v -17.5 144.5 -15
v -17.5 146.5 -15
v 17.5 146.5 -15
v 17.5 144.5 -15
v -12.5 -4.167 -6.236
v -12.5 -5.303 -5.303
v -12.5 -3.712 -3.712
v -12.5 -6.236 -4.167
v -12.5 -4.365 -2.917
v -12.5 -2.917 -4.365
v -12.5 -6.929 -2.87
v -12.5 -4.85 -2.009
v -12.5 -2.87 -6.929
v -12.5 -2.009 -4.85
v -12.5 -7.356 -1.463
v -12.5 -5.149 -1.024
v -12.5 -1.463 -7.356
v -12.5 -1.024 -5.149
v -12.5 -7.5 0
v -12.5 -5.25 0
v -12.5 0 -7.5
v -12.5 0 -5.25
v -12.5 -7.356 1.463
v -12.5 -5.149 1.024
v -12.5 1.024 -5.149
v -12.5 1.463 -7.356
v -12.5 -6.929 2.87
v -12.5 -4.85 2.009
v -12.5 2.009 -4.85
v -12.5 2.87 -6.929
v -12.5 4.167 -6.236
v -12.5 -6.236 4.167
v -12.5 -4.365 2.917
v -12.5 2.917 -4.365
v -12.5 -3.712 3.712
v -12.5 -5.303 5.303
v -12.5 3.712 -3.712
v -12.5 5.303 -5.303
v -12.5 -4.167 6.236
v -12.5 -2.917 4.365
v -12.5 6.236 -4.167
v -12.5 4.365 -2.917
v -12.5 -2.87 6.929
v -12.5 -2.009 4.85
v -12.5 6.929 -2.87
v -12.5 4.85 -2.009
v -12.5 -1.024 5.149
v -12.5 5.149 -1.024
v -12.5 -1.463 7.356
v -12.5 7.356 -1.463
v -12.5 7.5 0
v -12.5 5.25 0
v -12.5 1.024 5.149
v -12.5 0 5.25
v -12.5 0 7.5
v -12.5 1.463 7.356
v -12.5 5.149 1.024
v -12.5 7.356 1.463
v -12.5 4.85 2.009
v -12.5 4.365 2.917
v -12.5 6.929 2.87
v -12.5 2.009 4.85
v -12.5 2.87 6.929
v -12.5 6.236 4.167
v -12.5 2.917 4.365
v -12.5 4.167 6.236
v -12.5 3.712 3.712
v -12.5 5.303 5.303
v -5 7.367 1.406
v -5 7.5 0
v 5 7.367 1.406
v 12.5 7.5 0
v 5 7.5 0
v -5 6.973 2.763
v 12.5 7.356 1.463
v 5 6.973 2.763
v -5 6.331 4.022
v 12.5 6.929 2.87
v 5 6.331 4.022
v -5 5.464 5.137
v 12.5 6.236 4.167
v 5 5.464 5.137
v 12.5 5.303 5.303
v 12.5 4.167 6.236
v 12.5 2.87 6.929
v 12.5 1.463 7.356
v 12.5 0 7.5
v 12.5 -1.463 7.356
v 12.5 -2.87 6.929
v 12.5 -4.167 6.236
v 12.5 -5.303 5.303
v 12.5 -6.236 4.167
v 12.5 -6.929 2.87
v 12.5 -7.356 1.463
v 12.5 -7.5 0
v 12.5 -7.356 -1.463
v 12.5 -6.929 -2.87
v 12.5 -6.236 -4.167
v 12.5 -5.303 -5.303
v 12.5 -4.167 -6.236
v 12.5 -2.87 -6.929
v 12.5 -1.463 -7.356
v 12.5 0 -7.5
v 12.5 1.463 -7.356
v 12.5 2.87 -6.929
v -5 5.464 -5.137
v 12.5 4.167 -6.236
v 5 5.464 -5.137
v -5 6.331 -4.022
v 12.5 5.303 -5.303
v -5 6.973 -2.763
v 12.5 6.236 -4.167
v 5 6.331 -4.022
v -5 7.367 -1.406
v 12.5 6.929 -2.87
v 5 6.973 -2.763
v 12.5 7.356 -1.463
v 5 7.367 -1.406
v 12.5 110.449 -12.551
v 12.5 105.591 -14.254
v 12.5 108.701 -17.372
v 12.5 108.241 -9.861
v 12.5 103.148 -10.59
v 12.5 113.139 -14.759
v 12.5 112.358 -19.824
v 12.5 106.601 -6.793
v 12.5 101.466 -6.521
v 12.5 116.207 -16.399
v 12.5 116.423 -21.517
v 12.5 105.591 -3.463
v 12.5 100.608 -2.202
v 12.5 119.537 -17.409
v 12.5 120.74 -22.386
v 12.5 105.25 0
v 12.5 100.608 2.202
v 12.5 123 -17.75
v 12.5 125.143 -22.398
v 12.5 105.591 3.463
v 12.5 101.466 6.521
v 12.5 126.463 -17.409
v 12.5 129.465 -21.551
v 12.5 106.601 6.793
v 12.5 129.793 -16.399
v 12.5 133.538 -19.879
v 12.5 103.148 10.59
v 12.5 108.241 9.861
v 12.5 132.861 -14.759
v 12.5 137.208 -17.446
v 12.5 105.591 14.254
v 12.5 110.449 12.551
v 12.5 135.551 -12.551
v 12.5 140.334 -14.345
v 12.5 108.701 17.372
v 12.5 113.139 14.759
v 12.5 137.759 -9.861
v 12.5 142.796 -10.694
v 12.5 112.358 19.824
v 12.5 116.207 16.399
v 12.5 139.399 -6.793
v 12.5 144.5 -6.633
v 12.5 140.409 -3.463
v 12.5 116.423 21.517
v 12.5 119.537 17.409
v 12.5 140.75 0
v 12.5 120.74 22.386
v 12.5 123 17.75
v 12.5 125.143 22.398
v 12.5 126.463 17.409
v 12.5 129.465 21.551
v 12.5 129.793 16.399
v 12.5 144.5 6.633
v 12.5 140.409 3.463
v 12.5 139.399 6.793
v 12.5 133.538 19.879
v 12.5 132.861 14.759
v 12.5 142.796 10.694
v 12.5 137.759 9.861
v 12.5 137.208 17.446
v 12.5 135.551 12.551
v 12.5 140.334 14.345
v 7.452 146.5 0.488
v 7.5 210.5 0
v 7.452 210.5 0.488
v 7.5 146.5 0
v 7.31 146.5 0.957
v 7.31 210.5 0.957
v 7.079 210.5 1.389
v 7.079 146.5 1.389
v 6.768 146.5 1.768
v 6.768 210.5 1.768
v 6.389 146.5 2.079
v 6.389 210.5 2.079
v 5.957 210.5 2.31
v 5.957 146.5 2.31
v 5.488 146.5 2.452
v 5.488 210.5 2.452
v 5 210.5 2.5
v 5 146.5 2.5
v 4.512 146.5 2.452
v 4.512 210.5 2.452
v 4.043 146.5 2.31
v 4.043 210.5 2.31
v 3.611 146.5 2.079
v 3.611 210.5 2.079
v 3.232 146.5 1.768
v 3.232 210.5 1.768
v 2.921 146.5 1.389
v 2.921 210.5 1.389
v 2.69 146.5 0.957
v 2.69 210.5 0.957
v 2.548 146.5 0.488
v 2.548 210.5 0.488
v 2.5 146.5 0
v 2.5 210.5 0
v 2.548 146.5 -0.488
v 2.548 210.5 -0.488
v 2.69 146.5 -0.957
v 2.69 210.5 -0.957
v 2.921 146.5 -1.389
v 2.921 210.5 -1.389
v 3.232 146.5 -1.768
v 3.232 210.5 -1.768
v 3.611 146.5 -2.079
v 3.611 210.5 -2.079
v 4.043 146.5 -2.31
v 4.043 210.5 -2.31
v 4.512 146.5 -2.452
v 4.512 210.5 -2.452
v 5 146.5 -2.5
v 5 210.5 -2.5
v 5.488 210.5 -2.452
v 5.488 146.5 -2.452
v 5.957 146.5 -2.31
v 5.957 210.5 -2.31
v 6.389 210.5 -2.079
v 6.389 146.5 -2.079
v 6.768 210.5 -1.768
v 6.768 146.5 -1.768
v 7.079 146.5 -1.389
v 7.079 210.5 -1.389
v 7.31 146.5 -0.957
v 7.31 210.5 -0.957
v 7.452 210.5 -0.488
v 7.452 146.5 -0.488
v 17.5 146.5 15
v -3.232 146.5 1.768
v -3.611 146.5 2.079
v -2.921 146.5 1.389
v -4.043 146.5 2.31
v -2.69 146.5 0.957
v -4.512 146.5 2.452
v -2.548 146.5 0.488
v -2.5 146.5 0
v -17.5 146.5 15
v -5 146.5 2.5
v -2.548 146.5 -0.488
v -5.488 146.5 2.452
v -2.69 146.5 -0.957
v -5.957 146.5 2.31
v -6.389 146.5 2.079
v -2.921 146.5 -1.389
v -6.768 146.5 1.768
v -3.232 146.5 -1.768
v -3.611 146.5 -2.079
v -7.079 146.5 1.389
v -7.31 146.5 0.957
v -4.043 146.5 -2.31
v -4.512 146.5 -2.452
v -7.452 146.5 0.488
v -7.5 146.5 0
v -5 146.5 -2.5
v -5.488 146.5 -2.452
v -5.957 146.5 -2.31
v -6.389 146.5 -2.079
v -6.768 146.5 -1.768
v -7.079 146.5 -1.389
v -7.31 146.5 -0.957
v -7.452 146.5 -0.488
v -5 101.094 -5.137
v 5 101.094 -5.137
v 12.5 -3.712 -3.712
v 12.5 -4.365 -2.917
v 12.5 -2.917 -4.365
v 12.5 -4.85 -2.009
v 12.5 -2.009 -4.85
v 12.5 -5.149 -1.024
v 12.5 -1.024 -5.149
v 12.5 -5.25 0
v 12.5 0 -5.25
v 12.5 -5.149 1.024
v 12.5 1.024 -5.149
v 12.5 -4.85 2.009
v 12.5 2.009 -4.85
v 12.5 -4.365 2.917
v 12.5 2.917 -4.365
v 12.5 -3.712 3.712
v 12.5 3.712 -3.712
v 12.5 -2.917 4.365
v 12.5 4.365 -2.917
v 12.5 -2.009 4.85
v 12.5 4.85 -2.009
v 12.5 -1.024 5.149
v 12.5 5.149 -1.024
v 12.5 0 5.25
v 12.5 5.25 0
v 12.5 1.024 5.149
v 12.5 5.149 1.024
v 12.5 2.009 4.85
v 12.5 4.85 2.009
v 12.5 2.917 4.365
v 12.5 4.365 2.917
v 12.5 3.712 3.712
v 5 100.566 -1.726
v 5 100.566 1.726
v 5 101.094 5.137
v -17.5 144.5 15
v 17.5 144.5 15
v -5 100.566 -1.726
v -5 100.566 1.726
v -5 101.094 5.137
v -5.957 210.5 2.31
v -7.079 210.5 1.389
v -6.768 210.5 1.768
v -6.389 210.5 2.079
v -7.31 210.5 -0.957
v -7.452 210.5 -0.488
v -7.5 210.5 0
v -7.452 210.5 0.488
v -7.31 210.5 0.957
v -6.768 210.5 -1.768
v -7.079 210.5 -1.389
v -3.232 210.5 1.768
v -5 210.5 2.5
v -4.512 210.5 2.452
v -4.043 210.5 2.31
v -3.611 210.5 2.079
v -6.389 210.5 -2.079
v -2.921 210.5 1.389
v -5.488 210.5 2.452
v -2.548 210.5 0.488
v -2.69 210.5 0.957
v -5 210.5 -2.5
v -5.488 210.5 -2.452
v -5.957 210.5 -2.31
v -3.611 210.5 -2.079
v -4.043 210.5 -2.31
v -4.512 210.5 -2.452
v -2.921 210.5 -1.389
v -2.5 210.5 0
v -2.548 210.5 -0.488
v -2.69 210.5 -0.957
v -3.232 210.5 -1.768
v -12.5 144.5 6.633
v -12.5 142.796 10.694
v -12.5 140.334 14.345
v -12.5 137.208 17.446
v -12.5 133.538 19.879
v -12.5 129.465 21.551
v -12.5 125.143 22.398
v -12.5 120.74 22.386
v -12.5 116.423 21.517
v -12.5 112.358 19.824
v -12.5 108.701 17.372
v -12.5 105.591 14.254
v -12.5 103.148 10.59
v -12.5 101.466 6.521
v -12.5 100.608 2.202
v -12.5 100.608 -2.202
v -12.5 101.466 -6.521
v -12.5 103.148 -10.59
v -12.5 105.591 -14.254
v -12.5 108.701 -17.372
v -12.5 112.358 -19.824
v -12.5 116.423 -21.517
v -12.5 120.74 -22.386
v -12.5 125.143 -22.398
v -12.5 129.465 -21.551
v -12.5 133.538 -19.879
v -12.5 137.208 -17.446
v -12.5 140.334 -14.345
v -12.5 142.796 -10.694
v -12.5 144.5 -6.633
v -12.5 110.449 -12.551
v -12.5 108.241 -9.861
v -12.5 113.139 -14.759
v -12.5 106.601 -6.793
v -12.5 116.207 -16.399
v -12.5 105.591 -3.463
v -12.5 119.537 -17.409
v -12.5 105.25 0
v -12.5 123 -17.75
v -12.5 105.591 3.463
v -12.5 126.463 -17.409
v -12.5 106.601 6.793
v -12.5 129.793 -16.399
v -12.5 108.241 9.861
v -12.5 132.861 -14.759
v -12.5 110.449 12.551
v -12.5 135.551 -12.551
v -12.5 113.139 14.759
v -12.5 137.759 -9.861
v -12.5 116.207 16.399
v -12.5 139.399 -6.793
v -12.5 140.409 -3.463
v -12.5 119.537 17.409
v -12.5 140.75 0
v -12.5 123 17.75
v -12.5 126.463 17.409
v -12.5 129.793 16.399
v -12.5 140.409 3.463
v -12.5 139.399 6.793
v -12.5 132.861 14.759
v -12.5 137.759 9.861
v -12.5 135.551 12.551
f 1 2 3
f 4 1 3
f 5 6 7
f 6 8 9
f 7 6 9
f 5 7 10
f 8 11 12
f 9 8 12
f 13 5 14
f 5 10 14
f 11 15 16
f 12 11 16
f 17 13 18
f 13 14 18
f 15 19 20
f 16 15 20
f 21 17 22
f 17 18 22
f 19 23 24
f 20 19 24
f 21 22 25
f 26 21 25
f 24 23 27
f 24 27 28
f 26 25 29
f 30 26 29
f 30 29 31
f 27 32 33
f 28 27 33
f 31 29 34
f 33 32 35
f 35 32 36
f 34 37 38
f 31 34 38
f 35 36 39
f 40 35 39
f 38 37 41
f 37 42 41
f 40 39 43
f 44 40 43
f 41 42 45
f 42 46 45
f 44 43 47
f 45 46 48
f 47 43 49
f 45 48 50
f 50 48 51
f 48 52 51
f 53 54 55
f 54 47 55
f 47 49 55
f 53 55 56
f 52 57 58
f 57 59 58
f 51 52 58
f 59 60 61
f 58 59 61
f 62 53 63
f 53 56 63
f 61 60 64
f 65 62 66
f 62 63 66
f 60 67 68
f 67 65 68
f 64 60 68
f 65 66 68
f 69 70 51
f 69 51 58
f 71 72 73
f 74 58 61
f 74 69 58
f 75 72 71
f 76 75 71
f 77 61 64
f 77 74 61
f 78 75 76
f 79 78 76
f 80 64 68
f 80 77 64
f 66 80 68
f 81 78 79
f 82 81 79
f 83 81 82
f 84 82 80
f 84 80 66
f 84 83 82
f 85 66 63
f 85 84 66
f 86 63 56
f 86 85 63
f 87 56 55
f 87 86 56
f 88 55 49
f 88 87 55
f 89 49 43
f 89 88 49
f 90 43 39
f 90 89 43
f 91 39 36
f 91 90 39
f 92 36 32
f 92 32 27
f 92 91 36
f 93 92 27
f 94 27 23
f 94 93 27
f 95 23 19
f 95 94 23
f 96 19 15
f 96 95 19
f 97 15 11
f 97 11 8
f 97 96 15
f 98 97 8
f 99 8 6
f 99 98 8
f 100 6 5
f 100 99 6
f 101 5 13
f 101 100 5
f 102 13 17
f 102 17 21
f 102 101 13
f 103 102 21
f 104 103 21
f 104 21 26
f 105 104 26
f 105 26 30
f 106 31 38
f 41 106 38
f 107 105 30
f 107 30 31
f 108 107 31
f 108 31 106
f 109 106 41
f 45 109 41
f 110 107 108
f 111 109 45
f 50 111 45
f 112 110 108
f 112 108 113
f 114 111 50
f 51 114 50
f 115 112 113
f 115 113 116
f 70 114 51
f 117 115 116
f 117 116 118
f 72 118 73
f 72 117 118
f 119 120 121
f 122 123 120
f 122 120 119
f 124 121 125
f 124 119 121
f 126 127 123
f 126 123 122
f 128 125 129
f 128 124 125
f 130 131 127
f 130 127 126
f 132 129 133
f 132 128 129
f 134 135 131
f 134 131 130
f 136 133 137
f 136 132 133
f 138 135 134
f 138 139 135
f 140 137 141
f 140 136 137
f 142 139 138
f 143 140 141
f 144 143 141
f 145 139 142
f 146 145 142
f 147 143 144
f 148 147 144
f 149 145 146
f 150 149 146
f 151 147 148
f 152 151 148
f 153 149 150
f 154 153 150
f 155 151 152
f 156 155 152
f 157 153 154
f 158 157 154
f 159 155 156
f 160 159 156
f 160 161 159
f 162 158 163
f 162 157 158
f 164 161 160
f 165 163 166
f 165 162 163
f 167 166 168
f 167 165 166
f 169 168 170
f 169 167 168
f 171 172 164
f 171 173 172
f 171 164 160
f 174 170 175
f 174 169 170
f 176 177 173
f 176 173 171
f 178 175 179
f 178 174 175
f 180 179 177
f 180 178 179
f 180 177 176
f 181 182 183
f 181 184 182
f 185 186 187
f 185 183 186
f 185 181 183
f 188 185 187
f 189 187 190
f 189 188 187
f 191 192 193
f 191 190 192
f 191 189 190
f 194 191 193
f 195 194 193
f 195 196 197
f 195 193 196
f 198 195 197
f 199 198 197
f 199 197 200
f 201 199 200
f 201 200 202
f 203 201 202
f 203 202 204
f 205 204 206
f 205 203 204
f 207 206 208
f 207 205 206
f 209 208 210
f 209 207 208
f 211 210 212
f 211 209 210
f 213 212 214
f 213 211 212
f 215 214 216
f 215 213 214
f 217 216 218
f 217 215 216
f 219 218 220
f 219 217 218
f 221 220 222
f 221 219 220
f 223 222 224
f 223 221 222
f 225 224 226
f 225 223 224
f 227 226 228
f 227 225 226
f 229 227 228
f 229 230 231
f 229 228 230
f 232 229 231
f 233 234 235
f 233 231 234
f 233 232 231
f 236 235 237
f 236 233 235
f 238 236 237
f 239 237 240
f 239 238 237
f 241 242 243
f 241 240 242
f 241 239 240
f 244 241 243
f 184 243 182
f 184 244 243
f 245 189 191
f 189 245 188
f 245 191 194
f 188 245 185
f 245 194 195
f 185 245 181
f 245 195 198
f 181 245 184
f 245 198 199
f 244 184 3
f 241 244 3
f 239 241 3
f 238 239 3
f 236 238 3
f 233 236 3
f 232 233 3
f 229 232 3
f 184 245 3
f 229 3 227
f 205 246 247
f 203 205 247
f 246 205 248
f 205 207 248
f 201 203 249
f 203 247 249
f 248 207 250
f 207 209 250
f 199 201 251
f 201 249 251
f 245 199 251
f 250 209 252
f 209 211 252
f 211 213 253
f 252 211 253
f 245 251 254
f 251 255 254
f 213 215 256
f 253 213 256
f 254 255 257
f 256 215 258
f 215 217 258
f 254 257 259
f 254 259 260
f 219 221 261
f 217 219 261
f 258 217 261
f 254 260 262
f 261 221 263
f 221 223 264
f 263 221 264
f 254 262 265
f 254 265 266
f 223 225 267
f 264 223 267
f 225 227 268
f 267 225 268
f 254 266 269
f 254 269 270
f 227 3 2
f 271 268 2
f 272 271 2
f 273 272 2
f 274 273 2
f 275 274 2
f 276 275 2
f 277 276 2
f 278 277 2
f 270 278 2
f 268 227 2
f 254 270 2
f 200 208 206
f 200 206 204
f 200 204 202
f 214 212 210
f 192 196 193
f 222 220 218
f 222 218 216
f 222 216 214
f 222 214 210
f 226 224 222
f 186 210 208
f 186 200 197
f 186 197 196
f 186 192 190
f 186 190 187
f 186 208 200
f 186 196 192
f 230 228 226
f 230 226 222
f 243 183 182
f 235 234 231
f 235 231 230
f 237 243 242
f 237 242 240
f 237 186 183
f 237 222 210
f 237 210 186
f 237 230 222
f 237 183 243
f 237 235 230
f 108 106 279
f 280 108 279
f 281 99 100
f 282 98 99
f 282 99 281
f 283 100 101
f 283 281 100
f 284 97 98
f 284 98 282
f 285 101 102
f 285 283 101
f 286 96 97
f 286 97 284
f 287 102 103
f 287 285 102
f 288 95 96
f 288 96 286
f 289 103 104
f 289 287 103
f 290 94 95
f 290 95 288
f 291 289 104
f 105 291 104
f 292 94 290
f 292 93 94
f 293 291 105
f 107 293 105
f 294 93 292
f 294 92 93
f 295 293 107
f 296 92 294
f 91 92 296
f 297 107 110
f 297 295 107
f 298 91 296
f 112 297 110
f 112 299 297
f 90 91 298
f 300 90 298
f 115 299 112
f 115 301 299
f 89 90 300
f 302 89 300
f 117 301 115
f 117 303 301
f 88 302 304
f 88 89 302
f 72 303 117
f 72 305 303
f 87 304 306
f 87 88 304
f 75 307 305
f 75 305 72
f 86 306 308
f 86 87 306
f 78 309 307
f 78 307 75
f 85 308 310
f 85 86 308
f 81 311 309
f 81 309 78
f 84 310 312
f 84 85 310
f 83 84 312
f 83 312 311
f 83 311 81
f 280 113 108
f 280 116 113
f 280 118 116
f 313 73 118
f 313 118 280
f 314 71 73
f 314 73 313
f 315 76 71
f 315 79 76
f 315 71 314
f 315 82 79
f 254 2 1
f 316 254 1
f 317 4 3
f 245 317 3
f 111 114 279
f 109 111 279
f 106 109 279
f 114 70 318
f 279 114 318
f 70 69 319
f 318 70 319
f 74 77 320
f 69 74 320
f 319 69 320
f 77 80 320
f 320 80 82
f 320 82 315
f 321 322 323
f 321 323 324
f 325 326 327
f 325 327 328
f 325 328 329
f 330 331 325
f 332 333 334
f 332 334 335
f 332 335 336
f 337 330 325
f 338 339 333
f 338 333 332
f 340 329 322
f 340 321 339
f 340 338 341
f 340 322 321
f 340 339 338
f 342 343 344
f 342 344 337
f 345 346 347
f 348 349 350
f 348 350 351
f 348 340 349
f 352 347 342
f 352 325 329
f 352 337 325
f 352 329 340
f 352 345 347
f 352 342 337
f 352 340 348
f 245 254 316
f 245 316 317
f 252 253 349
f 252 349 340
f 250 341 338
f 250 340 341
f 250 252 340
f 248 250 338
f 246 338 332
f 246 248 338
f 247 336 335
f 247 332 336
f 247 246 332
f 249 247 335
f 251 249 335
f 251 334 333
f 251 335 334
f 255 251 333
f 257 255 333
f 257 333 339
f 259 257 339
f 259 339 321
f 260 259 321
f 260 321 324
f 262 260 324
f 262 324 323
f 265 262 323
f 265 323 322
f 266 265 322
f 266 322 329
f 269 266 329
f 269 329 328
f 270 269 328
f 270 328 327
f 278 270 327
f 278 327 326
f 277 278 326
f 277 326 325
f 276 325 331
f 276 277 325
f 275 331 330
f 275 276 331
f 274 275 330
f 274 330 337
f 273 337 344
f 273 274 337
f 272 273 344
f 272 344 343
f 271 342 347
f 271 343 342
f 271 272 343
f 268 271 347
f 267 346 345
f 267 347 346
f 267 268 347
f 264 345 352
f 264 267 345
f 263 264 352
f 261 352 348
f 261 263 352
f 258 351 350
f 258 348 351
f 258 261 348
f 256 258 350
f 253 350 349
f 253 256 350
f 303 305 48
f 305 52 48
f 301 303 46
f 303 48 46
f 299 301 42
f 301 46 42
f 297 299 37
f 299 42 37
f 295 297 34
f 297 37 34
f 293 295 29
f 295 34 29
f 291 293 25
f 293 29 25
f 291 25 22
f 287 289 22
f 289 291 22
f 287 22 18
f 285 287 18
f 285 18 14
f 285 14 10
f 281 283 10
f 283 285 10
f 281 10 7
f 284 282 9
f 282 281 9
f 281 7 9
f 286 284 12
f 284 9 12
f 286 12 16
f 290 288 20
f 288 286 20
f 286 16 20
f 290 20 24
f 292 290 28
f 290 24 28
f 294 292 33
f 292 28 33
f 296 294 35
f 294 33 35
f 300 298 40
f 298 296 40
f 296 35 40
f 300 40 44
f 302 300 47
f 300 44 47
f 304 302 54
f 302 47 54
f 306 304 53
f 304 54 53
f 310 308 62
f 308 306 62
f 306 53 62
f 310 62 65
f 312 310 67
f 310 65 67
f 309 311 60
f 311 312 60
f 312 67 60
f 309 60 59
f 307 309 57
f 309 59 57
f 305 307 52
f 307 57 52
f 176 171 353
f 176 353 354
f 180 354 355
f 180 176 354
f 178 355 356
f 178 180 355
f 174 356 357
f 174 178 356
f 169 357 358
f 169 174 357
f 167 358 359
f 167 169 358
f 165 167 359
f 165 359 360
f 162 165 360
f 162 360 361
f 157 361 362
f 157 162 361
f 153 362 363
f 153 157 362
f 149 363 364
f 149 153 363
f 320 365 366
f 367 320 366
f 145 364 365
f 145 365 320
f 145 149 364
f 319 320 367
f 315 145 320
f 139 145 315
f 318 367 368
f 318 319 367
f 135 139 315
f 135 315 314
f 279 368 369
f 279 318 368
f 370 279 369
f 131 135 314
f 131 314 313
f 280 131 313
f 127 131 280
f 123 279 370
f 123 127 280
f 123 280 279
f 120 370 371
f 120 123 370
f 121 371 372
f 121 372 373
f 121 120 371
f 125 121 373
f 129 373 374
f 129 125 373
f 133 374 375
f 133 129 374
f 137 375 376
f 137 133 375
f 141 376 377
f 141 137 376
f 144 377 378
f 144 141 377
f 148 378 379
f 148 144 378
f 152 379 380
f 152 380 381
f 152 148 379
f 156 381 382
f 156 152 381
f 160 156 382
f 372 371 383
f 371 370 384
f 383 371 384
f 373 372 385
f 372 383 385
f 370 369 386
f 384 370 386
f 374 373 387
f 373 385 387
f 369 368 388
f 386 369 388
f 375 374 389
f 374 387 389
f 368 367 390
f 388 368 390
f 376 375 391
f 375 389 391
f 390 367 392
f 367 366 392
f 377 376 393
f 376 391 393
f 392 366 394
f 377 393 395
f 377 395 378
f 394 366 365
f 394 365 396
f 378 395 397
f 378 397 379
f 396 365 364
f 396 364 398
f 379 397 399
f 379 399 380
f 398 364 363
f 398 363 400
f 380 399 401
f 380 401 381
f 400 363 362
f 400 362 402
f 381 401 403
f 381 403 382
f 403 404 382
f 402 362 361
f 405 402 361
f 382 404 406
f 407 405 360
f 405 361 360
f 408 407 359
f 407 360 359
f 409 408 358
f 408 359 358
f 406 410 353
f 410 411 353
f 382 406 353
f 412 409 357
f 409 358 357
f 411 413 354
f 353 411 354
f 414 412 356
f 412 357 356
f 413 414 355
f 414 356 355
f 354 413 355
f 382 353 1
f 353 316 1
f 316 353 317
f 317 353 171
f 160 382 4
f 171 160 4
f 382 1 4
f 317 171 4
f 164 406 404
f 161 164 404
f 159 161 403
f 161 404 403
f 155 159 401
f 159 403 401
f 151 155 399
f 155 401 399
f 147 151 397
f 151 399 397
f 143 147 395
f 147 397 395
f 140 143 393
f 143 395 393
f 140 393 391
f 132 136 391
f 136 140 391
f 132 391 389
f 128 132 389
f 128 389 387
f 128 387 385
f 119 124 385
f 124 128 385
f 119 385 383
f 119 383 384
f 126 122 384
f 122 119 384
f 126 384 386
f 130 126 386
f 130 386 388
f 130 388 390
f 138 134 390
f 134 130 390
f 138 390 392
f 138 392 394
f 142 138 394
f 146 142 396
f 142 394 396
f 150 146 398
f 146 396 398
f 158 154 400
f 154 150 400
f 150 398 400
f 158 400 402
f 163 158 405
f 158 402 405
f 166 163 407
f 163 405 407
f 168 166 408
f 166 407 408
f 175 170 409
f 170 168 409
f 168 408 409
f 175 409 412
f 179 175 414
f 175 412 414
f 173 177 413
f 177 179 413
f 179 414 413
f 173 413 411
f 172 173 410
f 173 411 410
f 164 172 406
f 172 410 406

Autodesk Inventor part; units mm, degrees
ref_plane "YZ Plane" through (0, 0, 0) normal (1, 0, 0) x (0, 1, 0)
ref_plane "XZ Plane" through (0, 0, 0) normal (0, 1, 0) x (-1, 0, 0)
ref_plane "XY Plane" through (0, 0, 0) normal (0, 0, 1) x (1, 0, 0)
sketch "Sketch1" plane through (0, 0, 0) normal (1, 0, 0) x (0, 1, 0)
  circle A0 centre (0, 0) radius 5.25
  line L0 (0, 0) -> (16.2396, 0) construction
  line L1 (5.4642, 5.1373) -> (101.0943, 5.1373)
  line L2 (5.4642, -5.1373) -> (101.0943, -5.1373)
  circle A1 centre (123, 0) radius 22.5
  circle A2 centre (123, 0) radius 17.75
  circle A3 centre (0, 0) radius 7.5
  dimension "d20" = 15
  dimension "d0" = 10.5
  dimension "d14" = 45
  dimension "d16" = 35.5
  dimension "d17" = 123
extrude "Extrusion1" add sketch "Sketch1" along normal mid plane 25 contours A3 | A1
extrude "Extrusion2" add sketch "Sketch1" along normal mid plane 10 contours L1 A1 L2 A3
sketch "Sketch2" plane through (0, 0, 0) normal (0, 0, 1) x (1, 0, 0)
  line L0 (-12.5, 145.5) -> (12.5, 145.5) projected
  line L1 (0, 113.4787) -> (0, 177.5213) construction
  line L2 (-17.5, 144.5) -> (17.5, 144.5)
  line L3 (17.5, 144.5) -> (17.5, 146.5)
  line L4 (17.5, 146.5) -> (-17.5, 146.5)
  line L5 (-17.5, 146.5) -> (-17.5, 144.5)
  point P0 (0, 0)
  point P1 (0, 145.5)
  point P2 (0, 146.5)
  dimension "d21" = 1
  dimension "d22" = 2
  dimension "d23" = 35
extrude "Extrusion3" add sketch "Sketch2" along normal mid plane 30
sketch "Sketch3" plane through (-17.5, 146.5, 15) normal (0, 1, 0) x (1, 0, 0)
  circle A0 centre (22.5, 15) radius 2.5
  circle A1 centre (12.5, 15) radius 2.5
  line L0 (17.5, -7.5) -> (17.5, 37.5) construction
  line L1 (5, 37.5) -> (30, 37.5) projected
  point P0 (17.5, 15)
  dimension "d26" = 5
  dimension "d27" = 5
  dimension "d28" = 5
  dimension "d29" = 5
extrude "Extrusion4" add sketch "Sketch3" along normal blind 64
properties part number "guide"
